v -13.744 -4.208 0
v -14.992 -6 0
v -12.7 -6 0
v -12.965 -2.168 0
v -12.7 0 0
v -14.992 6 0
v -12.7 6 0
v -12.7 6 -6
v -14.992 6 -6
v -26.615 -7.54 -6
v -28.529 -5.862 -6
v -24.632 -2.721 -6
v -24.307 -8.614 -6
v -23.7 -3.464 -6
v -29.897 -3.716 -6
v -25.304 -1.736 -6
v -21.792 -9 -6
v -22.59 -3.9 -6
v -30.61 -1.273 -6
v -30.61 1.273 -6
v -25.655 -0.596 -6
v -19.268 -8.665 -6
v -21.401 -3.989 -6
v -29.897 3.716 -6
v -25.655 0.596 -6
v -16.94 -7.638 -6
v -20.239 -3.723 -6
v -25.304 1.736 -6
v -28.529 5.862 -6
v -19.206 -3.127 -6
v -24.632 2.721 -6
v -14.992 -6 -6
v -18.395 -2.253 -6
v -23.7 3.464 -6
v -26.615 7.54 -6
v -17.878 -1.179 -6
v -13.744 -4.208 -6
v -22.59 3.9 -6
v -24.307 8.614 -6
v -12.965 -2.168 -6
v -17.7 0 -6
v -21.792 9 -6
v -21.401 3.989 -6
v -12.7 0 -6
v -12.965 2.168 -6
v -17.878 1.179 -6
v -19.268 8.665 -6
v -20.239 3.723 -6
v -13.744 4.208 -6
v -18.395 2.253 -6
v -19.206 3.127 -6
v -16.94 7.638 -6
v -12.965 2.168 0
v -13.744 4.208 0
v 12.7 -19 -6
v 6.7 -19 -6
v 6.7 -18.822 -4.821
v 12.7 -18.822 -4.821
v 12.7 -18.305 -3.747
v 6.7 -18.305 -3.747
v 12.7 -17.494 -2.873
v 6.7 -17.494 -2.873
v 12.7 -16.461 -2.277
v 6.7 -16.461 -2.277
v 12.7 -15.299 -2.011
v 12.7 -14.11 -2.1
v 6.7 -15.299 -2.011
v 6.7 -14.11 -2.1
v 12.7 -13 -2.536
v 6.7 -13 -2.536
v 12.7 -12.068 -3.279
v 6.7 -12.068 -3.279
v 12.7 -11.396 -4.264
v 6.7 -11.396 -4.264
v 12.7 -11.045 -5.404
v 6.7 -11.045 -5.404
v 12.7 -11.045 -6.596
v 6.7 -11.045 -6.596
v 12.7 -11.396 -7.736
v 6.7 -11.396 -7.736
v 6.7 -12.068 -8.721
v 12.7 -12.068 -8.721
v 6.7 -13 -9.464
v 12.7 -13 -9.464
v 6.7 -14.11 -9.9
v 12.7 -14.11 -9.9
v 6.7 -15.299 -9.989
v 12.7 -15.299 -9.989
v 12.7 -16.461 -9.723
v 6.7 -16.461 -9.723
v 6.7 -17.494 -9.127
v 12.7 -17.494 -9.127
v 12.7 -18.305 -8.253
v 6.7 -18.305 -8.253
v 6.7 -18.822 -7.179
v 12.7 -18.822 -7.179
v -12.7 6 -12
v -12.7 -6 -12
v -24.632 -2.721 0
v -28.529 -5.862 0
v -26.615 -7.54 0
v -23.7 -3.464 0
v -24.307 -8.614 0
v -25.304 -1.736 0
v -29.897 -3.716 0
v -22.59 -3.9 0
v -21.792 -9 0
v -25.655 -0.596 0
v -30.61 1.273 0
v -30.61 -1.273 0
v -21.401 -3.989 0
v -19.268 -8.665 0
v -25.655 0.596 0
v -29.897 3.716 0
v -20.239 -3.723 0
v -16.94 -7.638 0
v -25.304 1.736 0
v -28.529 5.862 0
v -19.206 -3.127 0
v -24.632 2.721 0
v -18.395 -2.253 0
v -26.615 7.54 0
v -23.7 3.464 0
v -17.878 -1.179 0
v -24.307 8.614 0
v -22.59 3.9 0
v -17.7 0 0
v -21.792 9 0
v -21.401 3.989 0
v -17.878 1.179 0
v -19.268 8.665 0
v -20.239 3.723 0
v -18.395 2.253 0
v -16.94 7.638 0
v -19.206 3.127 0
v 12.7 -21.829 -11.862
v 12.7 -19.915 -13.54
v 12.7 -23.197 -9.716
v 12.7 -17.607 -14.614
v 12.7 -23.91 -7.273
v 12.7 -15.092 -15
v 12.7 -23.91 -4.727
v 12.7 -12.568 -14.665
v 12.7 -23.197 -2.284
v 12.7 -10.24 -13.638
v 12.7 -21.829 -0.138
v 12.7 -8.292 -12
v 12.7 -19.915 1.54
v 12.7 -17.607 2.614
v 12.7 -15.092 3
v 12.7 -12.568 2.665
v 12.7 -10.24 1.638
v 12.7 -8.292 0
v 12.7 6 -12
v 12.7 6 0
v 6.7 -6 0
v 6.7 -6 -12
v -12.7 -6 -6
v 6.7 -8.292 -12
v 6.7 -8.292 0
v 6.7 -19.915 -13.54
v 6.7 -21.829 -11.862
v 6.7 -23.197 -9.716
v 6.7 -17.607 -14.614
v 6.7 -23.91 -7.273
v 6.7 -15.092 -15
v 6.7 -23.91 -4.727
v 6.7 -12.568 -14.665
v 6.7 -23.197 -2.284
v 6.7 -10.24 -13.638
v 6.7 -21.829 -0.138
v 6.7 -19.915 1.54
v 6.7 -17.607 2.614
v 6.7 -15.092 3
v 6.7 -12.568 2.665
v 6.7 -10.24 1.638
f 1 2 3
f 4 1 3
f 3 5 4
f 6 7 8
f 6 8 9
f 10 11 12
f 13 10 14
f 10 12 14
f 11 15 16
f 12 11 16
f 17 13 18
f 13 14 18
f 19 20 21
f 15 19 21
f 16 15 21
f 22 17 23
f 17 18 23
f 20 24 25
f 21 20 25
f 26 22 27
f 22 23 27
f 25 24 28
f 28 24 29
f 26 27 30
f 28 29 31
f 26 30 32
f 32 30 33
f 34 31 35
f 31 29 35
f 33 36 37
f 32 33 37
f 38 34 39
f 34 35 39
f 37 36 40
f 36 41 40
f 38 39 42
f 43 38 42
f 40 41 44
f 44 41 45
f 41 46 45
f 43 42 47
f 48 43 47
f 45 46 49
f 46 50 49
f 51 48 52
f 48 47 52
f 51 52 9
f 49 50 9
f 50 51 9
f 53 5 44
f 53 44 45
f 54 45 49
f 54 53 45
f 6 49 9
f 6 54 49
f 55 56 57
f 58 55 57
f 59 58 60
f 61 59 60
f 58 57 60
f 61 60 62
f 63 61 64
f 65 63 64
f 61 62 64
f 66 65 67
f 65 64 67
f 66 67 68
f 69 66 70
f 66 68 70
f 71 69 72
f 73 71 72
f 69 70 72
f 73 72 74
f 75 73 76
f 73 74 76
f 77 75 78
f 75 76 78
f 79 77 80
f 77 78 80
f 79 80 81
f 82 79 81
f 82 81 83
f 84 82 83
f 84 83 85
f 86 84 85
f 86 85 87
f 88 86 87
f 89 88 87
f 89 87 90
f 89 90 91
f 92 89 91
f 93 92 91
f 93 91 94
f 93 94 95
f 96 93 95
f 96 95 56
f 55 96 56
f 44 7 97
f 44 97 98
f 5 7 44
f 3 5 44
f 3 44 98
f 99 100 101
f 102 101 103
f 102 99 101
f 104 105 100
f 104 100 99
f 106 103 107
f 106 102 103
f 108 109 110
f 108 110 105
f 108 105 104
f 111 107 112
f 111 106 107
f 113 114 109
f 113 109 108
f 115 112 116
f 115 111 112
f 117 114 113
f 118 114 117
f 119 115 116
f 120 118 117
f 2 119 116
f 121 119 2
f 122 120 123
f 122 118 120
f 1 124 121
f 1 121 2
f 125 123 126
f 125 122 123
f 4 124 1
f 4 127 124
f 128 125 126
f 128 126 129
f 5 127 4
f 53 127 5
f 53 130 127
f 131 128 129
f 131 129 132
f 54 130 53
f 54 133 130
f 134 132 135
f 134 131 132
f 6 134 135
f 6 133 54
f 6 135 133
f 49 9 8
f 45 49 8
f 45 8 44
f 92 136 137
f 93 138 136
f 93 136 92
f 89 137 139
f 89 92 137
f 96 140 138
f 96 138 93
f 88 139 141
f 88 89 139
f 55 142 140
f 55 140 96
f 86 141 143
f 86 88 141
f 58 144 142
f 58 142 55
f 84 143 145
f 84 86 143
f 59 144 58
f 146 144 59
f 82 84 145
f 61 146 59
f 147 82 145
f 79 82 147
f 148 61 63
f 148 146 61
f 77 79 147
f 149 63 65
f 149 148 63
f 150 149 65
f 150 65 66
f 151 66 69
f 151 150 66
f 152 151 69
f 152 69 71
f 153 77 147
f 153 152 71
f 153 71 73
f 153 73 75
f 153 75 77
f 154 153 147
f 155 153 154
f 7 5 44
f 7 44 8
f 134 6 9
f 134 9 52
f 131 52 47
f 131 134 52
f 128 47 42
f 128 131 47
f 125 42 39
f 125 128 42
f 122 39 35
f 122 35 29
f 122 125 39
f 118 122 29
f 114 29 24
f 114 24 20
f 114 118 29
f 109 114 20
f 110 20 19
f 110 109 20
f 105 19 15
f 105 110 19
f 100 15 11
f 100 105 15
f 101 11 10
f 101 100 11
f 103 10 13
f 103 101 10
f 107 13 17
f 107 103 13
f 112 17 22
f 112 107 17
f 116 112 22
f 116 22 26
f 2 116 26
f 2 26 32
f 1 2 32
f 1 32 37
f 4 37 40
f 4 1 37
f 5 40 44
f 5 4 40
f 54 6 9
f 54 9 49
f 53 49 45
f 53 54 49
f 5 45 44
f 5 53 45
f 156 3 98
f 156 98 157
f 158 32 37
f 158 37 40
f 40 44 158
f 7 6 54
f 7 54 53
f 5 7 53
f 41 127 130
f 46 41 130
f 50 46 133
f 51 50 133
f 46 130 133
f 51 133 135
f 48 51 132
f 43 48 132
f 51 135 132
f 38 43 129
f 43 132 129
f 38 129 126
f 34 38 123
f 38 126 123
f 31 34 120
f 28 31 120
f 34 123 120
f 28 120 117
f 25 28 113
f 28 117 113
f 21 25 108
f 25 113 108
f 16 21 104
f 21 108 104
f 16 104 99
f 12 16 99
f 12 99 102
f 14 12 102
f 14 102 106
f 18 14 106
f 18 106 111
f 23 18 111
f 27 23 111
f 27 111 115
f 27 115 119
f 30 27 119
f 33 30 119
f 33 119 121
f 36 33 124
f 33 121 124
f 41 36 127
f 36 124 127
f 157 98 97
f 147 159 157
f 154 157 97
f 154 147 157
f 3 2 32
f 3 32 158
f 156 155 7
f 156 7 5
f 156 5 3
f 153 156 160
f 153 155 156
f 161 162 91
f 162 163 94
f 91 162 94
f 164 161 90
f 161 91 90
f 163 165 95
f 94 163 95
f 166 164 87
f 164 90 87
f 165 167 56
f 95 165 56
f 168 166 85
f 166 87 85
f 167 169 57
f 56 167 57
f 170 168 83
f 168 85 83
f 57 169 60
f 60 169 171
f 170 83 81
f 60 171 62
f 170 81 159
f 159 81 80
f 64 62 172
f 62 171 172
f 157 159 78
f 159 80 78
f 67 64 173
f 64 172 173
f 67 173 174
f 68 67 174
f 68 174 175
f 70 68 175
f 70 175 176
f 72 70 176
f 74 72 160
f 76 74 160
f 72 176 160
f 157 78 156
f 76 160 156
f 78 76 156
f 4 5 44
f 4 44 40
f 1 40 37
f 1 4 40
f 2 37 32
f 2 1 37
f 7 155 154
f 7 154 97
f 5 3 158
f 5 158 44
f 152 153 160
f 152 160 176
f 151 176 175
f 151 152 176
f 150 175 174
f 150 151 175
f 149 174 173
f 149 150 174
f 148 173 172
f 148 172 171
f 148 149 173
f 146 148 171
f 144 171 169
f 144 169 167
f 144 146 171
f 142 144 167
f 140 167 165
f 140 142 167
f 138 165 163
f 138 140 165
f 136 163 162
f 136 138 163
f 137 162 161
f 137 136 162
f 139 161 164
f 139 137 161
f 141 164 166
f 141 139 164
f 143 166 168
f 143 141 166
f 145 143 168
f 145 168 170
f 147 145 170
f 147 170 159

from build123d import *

# Parameters (mm, degrees)
F0_R     = 4
F1_DEPTH = 6
F0_W     = 12.7
F0_H     = 6
F2_DEPTH = 12
F3_DEPTH = 6
F5_DEPTH = 6
F6_D     = 8


with BuildPart() as f1:
    # F0 (on Top) → F1 (new body)
    with BuildSketch(Plane.XY):
        with BuildLine():
            ThreePointArc((-14.991796, -6), (-13.292449, -3.211399), (-12.7, 0))
            ThreePointArc((-12.7, 0), (-13.292449, 3.211399), (-14.991796, 6))
            ThreePointArc((-14.991796, 6), (-30.7, 0), (-14.991796, -6))
        make_face()
        with Locations((-21.7, 0)):
            Circle(F0_R, mode=Mode.SUBTRACT)
    extrude(amount=-F1_DEPTH)

    # F0 (on Top) → F2 (join)
    with BuildSketch(Plane.XY):
        with Locations((-6.35, 3)):
            Rectangle(F0_W, F0_H)
        with Locations((6.35, 3)):
            Rectangle(F0_W, F0_H)
        with Locations((-6.35, -3)):
            Rectangle(F0_W, F0_H)
        Polygon((12.7, 0), (0, 0), (0, -6), (7.7, -6), (12.7, -6), align=None)
    extrude(amount=-F2_DEPTH)

    # F4 (on face) → F5 (join)
    with BuildSketch(Plane.YZ.offset(12.7)):
        with BuildLine():
            ThreePointArc((-8.291796, -12), (-6.592449, -9.211399), (-6, -6))
            ThreePointArc((-6, -6), (-6.592449, -2.788601), (-8.291796, 0))
            ThreePointArc((-8.291796, 0), (-24, -6), (-8.291796, -12))
        make_face()
        with BuildLine():
            Line((-6, -12), (-6, -6))
            ThreePointArc((-6, -6), (-6.592449, -9.211399), (-8.291796, -12))
            Line((-8.291796, -12), (-6, -12))
        make_face()
        with BuildLine():
            Line((-6, -6), (-6, 0))
            Line((-6, 0), (-8.291796, 0))
            ThreePointArc((-8.291796, 0), (-6.592449, -2.788601), (-6, -6))
        make_face()
    extrude(amount=-F5_DEPTH)

    # F6 (through all)
    with Locations(Plane.YZ.offset(12.7)):
        with Locations((-15, -6)):
            Hole(F6_D / 2)


with BuildPart() as f3:
    # F0 (on Top) → F3 (new body)
    with BuildSketch(Plane.XY):
        with BuildLine():
            ThreePointArc((-14.991796, 6), (-13.292449, 3.211399), (-12.7, 0))
            Line((-12.7, 0), (-12.7, 6))
            Line((-12.7, 6), (-14.991796, 6))
        make_face()
        with BuildLine():
            Line((-12.7, -6), (-12.7, 0))
            ThreePointArc((-12.7, 0), (-13.292449, -3.211399), (-14.991796, -6))
            Line((-14.991796, -6), (-12.7, -6))
        make_face()
    extrude(amount=-F3_DEPTH)


solid = Compound([f1.part, f3.part])
